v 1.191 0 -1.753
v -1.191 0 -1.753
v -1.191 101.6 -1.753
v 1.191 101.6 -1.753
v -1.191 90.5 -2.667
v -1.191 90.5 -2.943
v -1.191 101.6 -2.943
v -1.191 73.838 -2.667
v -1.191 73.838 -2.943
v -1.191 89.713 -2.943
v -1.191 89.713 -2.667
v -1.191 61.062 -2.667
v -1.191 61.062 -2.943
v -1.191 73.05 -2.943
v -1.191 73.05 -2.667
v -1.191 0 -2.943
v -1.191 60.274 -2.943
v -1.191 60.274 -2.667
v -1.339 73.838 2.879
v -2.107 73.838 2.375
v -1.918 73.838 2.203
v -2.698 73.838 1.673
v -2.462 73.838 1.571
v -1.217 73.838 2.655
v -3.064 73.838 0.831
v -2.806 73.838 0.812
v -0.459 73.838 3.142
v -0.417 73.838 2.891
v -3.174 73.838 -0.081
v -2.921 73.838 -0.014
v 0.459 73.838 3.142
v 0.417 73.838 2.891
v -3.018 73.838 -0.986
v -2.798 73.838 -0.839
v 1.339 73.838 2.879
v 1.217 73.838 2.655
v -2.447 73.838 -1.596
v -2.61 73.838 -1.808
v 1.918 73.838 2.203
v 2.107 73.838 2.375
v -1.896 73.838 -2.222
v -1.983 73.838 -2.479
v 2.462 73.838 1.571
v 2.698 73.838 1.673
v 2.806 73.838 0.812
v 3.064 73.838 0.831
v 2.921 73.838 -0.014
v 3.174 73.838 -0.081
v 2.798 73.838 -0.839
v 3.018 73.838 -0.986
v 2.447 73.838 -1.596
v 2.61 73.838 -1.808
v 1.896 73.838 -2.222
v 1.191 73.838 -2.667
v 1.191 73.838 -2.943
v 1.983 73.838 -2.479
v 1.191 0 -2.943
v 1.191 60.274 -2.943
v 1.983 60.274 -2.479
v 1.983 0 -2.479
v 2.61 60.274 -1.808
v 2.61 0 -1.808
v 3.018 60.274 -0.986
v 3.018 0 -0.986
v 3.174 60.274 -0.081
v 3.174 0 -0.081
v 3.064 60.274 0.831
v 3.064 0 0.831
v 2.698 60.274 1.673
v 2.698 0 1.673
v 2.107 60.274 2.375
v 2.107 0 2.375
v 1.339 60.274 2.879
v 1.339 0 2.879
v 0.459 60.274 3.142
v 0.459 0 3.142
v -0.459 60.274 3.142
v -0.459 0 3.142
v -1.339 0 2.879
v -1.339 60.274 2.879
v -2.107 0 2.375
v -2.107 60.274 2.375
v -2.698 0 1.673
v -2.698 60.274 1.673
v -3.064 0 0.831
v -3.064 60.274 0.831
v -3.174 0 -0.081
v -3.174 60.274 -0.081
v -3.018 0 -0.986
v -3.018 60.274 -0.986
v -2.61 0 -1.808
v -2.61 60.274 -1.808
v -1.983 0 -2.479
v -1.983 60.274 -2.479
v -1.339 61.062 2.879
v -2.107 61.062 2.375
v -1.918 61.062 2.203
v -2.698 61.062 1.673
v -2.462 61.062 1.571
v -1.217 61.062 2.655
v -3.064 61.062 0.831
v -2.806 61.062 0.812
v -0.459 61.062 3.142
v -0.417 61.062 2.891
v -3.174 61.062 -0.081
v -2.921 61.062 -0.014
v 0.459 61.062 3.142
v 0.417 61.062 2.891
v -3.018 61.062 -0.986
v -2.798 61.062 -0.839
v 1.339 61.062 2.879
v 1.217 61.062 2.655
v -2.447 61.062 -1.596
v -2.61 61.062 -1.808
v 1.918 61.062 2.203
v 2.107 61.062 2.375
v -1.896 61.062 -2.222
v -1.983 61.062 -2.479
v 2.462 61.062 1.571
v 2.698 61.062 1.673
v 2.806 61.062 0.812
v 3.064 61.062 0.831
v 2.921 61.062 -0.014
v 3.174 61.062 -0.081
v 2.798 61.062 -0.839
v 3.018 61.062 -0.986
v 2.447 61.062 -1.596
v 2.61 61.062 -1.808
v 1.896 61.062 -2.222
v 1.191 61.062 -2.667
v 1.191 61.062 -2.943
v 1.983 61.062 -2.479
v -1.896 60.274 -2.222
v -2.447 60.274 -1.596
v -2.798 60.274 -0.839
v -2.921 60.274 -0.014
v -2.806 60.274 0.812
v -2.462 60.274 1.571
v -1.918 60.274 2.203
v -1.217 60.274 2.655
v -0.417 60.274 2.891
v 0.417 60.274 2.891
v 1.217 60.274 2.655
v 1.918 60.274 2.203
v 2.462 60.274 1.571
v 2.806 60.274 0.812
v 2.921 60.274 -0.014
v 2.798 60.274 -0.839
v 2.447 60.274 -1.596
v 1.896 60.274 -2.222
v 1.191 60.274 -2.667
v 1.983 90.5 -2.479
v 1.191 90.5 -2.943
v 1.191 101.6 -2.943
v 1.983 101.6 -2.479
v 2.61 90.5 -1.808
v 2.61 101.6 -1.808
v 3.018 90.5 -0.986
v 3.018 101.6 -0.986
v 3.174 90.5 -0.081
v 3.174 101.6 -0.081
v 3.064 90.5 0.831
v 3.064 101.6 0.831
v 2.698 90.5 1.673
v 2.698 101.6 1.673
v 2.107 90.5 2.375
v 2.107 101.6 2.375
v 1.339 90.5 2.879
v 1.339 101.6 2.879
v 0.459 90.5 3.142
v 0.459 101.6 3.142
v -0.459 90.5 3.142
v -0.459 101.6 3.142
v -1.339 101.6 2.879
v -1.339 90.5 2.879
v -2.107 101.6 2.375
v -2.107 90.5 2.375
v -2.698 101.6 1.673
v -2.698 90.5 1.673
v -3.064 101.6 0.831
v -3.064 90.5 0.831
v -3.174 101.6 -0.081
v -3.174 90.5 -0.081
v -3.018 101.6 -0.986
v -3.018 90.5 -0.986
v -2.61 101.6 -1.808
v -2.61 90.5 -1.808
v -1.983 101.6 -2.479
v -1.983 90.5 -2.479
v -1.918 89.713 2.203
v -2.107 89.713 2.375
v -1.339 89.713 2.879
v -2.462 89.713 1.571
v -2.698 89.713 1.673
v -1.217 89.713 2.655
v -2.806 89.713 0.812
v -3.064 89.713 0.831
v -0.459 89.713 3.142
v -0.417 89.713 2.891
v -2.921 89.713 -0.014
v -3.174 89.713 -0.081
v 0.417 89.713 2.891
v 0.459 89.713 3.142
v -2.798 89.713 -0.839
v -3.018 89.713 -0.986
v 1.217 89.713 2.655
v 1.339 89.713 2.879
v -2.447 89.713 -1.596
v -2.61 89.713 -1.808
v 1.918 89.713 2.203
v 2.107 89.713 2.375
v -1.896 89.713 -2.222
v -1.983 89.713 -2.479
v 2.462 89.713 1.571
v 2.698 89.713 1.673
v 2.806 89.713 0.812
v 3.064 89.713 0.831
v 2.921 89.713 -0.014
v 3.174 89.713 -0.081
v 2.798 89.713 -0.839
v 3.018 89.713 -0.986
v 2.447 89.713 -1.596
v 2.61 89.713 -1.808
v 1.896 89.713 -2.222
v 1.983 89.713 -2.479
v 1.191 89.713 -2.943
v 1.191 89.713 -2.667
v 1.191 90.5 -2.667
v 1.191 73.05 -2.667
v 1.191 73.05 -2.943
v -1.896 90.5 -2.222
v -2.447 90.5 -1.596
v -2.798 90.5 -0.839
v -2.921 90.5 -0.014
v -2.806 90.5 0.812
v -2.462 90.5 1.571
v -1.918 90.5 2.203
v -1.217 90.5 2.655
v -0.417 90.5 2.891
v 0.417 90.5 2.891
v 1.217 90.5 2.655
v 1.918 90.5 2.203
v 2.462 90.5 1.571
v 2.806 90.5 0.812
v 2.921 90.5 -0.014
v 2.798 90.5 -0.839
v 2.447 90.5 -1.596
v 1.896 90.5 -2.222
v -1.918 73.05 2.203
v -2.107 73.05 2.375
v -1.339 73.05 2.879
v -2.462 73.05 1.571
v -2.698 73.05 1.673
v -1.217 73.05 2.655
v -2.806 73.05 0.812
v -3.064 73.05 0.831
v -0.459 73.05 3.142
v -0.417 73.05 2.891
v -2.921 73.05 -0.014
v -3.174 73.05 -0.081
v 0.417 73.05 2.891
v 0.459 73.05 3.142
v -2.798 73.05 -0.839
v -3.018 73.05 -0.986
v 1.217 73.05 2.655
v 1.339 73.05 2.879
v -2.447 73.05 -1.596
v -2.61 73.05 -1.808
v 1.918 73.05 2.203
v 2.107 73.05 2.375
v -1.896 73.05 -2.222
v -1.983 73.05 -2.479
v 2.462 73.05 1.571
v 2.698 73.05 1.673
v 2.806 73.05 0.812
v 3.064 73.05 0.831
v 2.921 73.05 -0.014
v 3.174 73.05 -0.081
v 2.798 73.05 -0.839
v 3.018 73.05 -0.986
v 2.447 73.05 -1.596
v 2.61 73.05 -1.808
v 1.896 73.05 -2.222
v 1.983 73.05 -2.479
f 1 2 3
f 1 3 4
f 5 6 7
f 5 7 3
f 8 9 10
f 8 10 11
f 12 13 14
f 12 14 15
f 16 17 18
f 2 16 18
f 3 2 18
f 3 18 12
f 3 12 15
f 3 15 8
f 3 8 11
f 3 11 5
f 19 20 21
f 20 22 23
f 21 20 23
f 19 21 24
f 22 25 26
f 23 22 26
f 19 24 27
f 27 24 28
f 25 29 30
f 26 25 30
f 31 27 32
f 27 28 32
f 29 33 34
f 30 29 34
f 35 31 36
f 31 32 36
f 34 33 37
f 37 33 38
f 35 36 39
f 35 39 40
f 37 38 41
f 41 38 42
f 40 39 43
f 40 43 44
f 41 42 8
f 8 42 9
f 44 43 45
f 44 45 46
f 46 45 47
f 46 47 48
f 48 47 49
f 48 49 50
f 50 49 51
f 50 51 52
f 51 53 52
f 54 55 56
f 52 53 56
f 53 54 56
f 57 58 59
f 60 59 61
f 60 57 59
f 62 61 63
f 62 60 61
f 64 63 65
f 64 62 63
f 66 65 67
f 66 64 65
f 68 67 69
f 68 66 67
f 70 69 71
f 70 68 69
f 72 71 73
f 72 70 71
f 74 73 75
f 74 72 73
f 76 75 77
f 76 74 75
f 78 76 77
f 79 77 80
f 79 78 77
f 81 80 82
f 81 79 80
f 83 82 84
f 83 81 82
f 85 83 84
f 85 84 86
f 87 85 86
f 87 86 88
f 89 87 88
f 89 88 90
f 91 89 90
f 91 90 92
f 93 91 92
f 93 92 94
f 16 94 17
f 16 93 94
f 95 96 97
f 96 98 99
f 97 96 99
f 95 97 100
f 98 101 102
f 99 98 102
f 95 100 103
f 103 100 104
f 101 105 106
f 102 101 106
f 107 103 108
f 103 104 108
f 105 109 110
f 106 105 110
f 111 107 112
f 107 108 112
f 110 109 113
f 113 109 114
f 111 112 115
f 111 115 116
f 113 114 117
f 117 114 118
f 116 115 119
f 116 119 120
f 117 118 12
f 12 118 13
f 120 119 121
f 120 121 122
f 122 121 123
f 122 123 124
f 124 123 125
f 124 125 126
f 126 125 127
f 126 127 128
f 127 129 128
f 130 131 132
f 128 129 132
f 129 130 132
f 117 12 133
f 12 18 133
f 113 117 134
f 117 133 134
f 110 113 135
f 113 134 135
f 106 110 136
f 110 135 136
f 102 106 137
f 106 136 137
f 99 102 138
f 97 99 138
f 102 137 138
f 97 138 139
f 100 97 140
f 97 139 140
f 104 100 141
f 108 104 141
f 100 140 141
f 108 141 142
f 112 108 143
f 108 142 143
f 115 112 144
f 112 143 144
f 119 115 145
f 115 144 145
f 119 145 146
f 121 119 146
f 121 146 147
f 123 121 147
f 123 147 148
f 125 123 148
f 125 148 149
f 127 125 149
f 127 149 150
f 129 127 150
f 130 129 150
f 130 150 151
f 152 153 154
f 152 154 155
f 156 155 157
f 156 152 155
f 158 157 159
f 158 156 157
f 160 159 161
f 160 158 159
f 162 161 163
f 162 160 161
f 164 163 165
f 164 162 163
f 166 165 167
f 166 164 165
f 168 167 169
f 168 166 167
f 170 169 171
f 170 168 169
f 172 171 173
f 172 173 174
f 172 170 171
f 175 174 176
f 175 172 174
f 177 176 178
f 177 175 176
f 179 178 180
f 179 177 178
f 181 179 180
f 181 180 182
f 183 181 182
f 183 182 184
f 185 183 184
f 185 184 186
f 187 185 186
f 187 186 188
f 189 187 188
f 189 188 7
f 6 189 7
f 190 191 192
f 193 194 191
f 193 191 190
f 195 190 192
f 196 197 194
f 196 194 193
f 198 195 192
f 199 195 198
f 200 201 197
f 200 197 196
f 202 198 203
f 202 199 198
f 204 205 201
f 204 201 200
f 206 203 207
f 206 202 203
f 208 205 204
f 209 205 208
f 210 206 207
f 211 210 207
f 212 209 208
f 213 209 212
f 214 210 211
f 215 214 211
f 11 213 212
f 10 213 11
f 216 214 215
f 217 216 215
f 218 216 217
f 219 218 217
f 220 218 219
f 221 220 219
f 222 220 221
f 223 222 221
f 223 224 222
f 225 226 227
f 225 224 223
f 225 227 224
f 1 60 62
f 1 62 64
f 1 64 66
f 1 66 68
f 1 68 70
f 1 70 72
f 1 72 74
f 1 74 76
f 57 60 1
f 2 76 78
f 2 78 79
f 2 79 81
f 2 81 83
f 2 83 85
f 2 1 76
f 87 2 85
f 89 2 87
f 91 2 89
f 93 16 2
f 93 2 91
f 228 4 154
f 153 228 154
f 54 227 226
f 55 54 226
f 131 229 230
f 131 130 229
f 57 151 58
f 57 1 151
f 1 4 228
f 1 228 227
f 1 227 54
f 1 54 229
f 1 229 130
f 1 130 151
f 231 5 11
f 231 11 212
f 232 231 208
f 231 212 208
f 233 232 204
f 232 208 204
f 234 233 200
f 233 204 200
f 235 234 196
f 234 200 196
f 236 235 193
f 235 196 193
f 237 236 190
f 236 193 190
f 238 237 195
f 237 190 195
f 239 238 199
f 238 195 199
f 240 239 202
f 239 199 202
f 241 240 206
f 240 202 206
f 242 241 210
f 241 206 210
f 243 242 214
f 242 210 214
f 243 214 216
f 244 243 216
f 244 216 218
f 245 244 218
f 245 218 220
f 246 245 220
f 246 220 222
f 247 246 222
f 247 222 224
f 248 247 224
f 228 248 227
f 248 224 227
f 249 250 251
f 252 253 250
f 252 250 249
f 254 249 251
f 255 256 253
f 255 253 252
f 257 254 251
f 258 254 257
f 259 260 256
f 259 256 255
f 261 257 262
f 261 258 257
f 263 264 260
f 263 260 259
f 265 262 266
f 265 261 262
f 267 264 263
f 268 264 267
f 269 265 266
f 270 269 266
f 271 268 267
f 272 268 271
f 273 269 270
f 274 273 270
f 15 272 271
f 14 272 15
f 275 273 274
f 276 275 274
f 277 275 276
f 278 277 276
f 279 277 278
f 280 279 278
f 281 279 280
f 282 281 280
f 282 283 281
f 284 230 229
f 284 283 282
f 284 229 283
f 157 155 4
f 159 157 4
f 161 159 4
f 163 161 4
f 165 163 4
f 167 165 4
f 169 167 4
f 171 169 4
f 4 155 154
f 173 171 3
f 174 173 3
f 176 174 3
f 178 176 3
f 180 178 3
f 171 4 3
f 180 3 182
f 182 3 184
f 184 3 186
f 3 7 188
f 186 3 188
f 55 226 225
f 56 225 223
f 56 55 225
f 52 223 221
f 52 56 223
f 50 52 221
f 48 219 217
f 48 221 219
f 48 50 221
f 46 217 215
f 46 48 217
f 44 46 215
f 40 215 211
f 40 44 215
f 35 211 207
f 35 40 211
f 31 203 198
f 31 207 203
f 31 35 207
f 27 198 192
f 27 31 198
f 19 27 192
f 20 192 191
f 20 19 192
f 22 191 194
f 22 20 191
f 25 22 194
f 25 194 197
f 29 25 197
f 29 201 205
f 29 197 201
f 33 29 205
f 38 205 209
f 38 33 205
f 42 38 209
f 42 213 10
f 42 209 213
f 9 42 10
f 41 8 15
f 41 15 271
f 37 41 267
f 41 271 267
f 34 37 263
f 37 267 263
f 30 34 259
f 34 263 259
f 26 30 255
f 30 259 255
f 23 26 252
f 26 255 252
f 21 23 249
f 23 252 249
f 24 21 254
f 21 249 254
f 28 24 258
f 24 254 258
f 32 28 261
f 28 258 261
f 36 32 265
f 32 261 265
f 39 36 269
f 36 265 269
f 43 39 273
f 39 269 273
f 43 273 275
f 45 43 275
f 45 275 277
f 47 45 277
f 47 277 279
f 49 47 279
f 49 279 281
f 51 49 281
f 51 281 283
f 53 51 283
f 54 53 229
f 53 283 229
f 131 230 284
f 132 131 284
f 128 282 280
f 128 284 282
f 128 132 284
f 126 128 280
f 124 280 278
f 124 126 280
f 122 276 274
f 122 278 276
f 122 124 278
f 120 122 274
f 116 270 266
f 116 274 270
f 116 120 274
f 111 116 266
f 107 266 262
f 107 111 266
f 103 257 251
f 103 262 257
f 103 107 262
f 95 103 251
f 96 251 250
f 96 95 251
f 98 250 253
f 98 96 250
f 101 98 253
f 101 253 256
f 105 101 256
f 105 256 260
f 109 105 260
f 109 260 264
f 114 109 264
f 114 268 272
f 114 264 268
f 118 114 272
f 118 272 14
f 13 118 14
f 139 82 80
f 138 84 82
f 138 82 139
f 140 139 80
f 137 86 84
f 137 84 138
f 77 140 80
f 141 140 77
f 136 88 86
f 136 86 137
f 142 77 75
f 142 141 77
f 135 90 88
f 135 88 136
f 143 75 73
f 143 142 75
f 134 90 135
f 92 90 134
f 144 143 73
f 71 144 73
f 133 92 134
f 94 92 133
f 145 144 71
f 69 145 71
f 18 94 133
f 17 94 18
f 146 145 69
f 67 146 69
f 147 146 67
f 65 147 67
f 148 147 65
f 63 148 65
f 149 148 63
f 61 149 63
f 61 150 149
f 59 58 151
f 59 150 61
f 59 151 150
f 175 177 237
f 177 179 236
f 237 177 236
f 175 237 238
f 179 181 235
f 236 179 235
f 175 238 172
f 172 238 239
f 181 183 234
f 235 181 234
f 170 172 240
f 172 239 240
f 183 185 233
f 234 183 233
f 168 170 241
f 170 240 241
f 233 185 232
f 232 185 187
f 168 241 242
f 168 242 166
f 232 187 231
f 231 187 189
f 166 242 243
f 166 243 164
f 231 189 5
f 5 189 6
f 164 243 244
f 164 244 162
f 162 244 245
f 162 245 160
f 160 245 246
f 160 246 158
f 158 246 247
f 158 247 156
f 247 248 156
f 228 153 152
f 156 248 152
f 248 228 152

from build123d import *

# Parameters (mm, degrees)
BOSS_EXTRUDE1_DEPTH = 101.6
CUT_EXTRUDE1_START  = -41.3258
SKETCH3_R           = 3.175
SKETCH3_R_2         = 2.921
CUT_EXTRUDE1_DEPTH  = 0.7874
CUT_EXTRUDE2_START  = -28.5496
SKETCH3_3_R         = 3.175
SKETCH3_3_R_2       = 2.921
CUT_EXTRUDE2_DEPTH  = 0.7874
CUT_EXTRUDE3_START  = -11.8872
SKETCH3_4_R         = 3.175
SKETCH3_4_R_2       = 2.921
CUT_EXTRUDE3_DEPTH  = 0.7874


with BuildPart() as part:
    # Sketch1 → Boss-Extrude1 (new body)
    with BuildSketch(Plane(origin=(0, 0, 0), x_dir=(1, 0, 0), z_dir=(0, 1, 0))):
        with BuildLine():
            Line((-1.190625, 2.943303775), (-1.190625, 1.752678775))
            Line((-1.190625, 1.752678775), (1.190625, 1.752678775))
            Line((1.190625, 1.752678775), (1.190625, 2.943303775))
            ThreePointArc((1.190625, 2.943303775), (0, -3.175), (-1.190625, 2.943303775))
        make_face()
    extrude(amount=BOSS_EXTRUDE1_DEPTH)

    # Sketch3 → Cut-Extrude1 (cut)
    with BuildSketch(Plane(origin=(0, 101.6, 0), x_dir=(1, 0, 0), z_dir=(0, 1, 0)).offset(CUT_EXTRUDE1_START)):
        Circle(SKETCH3_R)
        Circle(SKETCH3_R_2, mode=Mode.SUBTRACT)
    extrude(amount=CUT_EXTRUDE1_DEPTH, mode=Mode.SUBTRACT)

    # Sketch3<3> → Cut-Extrude2 (cut)
    with BuildSketch(Plane(origin=(0, 101.6, 0), x_dir=(1, 0, 0), z_dir=(0, 1, 0)).offset(CUT_EXTRUDE2_START)):
        Circle(SKETCH3_3_R)
        Circle(SKETCH3_3_R_2, mode=Mode.SUBTRACT)
    extrude(amount=CUT_EXTRUDE2_DEPTH, mode=Mode.SUBTRACT)

    # Sketch3<4> → Cut-Extrude3 (cut)
    with BuildSketch(Plane(origin=(0, 101.6, 0), x_dir=(1, 0, 0), z_dir=(0, 1, 0)).offset(CUT_EXTRUDE3_START)):
        Circle(SKETCH3_4_R)
        Circle(SKETCH3_4_R_2, mode=Mode.SUBTRACT)
    extrude(amount=CUT_EXTRUDE3_DEPTH, mode=Mode.SUBTRACT)


solid = part.part
